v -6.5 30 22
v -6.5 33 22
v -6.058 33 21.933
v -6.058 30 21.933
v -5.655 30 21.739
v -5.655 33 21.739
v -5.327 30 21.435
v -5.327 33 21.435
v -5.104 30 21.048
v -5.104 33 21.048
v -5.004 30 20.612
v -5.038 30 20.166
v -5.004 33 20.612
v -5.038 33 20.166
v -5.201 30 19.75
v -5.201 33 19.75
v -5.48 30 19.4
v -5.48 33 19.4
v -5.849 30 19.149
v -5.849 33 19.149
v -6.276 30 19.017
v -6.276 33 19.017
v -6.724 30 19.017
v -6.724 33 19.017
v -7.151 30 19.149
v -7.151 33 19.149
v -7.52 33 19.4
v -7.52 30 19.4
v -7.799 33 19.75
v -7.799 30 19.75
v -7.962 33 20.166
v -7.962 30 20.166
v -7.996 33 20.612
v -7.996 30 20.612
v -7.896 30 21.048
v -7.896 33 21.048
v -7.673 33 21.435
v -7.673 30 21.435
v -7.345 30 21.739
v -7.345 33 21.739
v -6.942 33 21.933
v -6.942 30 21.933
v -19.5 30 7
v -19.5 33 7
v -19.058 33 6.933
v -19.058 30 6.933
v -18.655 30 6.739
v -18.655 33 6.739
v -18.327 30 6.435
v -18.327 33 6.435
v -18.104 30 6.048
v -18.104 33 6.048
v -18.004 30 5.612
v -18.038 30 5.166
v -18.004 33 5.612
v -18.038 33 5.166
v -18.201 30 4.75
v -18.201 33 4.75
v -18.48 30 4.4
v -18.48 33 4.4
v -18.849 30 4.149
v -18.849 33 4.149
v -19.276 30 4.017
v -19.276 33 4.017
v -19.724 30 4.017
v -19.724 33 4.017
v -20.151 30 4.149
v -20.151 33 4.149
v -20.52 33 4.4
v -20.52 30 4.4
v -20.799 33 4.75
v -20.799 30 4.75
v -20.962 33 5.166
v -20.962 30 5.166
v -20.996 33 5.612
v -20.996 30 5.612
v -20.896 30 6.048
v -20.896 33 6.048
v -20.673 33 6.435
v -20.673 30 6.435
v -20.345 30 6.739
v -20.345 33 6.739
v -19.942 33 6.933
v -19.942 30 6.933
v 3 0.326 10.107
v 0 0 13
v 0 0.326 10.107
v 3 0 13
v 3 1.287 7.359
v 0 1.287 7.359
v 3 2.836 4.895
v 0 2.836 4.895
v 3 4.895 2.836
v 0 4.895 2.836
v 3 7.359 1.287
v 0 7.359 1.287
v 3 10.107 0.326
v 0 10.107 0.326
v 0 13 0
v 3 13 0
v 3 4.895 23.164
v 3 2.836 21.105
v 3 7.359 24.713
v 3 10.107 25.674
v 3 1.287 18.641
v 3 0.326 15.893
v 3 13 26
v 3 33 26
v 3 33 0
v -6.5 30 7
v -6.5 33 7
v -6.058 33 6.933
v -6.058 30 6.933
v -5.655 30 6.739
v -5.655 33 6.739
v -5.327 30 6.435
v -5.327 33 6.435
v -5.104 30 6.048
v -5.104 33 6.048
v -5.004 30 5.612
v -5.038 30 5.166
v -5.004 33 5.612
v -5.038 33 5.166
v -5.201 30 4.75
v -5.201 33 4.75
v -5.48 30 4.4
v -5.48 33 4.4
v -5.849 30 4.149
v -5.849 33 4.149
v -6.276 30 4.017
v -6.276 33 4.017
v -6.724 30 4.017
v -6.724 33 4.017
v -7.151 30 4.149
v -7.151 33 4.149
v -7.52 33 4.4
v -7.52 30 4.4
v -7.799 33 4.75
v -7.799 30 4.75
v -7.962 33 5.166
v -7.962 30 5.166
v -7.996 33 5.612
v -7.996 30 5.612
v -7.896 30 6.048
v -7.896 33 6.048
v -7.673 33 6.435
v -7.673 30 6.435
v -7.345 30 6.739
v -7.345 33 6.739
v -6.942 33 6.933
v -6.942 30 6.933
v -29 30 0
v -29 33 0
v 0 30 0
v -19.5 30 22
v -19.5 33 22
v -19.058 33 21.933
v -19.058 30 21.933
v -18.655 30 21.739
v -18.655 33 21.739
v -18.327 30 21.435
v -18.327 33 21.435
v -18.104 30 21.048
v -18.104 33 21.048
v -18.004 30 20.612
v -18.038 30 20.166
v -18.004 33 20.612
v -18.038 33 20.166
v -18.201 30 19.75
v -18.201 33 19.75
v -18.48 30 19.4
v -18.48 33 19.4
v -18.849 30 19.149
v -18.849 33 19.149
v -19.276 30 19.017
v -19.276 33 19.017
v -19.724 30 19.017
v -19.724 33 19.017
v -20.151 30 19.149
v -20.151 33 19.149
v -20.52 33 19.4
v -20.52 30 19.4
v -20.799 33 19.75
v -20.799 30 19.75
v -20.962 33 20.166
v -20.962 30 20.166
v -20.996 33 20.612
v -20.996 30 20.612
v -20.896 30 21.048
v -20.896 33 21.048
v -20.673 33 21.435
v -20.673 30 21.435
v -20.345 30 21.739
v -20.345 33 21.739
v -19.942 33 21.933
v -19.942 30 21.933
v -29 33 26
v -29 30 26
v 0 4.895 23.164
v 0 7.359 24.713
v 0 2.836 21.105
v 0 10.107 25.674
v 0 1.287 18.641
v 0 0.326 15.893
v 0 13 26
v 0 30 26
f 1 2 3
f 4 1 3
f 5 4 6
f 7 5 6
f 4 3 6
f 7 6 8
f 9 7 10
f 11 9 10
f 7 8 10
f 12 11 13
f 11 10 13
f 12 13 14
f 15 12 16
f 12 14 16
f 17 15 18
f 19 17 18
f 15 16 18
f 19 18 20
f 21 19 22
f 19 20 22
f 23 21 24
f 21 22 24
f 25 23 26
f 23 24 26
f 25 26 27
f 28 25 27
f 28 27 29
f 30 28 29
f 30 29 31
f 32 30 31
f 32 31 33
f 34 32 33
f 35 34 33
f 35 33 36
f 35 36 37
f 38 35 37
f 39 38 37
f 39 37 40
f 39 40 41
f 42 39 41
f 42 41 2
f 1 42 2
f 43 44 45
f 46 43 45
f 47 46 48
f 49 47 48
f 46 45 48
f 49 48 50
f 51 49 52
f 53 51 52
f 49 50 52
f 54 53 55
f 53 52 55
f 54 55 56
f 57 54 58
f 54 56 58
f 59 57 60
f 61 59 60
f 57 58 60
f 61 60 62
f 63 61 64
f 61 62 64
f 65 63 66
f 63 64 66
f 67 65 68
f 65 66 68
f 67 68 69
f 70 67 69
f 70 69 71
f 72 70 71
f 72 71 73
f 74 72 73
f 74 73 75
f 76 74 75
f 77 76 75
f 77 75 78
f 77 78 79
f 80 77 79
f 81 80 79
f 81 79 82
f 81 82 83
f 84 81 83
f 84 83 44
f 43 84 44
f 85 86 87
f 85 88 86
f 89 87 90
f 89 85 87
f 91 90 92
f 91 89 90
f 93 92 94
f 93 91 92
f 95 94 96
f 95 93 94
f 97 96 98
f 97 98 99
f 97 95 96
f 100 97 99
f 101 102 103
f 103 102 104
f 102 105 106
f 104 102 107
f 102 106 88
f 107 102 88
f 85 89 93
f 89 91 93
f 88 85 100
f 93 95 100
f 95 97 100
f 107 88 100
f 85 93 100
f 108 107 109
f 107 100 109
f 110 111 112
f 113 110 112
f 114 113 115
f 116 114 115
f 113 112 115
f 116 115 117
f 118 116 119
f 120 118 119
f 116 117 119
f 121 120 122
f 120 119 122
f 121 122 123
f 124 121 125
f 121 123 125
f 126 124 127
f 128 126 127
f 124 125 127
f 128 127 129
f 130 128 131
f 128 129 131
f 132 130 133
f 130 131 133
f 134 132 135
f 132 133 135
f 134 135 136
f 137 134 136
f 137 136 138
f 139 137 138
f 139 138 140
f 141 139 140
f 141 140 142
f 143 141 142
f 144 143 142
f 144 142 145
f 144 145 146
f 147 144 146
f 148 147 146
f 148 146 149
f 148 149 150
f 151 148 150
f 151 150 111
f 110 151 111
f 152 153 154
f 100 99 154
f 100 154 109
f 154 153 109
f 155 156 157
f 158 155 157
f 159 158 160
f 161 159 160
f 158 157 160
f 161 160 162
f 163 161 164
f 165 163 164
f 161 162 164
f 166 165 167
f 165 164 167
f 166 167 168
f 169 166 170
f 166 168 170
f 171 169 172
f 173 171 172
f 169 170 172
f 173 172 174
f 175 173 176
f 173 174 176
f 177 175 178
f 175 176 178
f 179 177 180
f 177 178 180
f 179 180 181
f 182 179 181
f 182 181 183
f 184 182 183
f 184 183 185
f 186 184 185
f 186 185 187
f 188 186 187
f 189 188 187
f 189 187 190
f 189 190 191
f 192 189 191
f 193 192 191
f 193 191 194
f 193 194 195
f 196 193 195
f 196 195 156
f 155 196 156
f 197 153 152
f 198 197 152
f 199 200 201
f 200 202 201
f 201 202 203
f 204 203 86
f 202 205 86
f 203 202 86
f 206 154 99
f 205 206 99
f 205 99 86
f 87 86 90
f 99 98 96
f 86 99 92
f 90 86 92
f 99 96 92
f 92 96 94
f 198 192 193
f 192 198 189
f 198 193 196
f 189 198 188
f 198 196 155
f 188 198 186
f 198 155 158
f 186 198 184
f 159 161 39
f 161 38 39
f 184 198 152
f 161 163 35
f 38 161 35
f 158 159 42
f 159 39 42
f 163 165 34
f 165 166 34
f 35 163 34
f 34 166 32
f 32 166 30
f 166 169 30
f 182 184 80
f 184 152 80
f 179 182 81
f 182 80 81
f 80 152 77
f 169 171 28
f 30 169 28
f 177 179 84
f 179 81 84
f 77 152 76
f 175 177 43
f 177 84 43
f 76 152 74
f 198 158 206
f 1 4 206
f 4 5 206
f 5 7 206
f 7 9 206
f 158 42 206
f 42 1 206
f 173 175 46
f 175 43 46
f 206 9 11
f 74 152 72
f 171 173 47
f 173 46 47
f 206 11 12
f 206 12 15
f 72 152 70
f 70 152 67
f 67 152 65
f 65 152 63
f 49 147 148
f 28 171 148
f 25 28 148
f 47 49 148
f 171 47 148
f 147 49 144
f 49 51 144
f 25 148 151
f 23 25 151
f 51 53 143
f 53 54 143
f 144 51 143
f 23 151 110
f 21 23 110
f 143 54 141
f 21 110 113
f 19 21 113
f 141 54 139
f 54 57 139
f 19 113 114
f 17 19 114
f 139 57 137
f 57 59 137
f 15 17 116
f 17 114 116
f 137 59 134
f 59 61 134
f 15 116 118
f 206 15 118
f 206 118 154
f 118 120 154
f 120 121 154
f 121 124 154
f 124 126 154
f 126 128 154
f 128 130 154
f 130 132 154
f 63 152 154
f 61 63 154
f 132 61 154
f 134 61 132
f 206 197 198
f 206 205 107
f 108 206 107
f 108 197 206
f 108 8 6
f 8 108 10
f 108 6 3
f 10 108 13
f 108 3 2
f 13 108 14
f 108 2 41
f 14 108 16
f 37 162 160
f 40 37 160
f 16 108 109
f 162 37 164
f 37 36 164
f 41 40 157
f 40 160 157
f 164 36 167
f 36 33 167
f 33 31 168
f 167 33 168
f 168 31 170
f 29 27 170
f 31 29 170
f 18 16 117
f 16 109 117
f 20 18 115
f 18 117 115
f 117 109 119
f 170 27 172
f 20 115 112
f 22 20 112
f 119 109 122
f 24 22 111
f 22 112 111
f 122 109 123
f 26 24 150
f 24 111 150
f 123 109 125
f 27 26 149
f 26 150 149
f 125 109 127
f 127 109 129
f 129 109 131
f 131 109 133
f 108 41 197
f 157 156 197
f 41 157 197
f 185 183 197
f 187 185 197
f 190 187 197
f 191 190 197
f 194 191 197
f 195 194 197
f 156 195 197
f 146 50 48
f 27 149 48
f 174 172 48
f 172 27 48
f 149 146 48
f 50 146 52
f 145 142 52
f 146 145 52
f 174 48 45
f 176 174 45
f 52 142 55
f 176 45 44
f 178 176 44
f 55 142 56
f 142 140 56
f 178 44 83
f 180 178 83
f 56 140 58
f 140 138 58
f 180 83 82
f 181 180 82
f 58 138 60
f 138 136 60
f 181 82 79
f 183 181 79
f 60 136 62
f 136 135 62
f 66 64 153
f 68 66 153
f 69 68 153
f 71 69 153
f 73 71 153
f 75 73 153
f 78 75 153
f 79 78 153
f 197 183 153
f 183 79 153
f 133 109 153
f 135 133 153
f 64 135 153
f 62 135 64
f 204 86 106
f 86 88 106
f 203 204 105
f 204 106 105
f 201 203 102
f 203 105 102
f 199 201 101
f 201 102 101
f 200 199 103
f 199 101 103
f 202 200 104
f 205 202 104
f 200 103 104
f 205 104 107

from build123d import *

# Parameters (mm, degrees)
BOSS_EXTRUDE1_DEPTH = 26
FILLET1_R           = 13
CUT_EXTRUDE1_REACH  = 53.049
SKETCH2_R           = 1.5


with BuildPart() as part:
    # Sketch1 → Boss-Extrude1 (new body)
    with BuildSketch(Plane.XY):
        Polygon((0, 0), (3, 0), (3, 33), (-29, 33), (-29, 30), (0, 30), align=None)
    extrude(amount=BOSS_EXTRUDE1_DEPTH)

    # Fillet1
    fillet1_edges = [part.edges().sort_by_distance(p)[0] for p in [
        (1.5, 0, 0),
        (1.5, 0, 26),
    ]]
    fillet(fillet1_edges, radius=FILLET1_R - 0.0001)  # a hair under: the kernel refuses the full size

    # Sketch2 → Cut-Extrude1 (cut, up to next)
    with BuildSketch(Plane(origin=(0, 33, 0), x_dir=(1, 0, 0), z_dir=(0, 1, 0)), mode=Mode.PRIVATE) as cut_extrude1_sk1:
        with Locations(Location((-19.5, -5.5, 0), (0, 0, 270))):
            Circle(SKETCH2_R)
    cut_extrude1_tool1 = extrude(cut_extrude1_sk1.sketch, amount=-CUT_EXTRUDE1_REACH, mode=Mode.PRIVATE) & part.part
    # Sketch2 → Cut-Extrude1 (cut, up to next)
    with BuildSketch(Plane(origin=(0, 33, 0), x_dir=(1, 0, 0), z_dir=(0, 1, 0)), mode=Mode.PRIVATE) as cut_extrude1_sk2:
        with Locations(Location((-19.5, -20.5, 0), (0, 0, 270))):
            Circle(SKETCH2_R)
    cut_extrude1_tool2 = extrude(cut_extrude1_sk2.sketch, amount=-CUT_EXTRUDE1_REACH, mode=Mode.PRIVATE) & part.part
    # Sketch2 → Cut-Extrude1 (cut, up to next)
    with BuildSketch(Plane(origin=(0, 33, 0), x_dir=(1, 0, 0), z_dir=(0, 1, 0)), mode=Mode.PRIVATE) as cut_extrude1_sk3:
        with Locations(Location((-6.5, -5.5, 0), (0, 0, 270))):
            Circle(SKETCH2_R)
    cut_extrude1_tool3 = extrude(cut_extrude1_sk3.sketch, amount=-CUT_EXTRUDE1_REACH, mode=Mode.PRIVATE) & part.part
    # Sketch2 → Cut-Extrude1 (cut, up to next)
    with BuildSketch(Plane(origin=(0, 33, 0), x_dir=(1, 0, 0), z_dir=(0, 1, 0)), mode=Mode.PRIVATE) as cut_extrude1_sk4:
        with Locations(Location((-6.5, -20.5, 0), (0, 0, 270))):
            Circle(SKETCH2_R)
    cut_extrude1_tool4 = extrude(cut_extrude1_sk4.sketch, amount=-CUT_EXTRUDE1_REACH, mode=Mode.PRIVATE) & part.part
    add(cut_extrude1_tool1.solids().sort_by_distance((-19.5, 33, 5.5))[0], mode=Mode.SUBTRACT)
    add(cut_extrude1_tool2.solids().sort_by_distance((-19.5, 33, 20.5))[0], mode=Mode.SUBTRACT)
    add(cut_extrude1_tool3.solids().sort_by_distance((-6.5, 33, 5.5))[0], mode=Mode.SUBTRACT)
    add(cut_extrude1_tool4.solids().sort_by_distance((-6.5, 33, 20.5))[0], mode=Mode.SUBTRACT)


solid = part.part
